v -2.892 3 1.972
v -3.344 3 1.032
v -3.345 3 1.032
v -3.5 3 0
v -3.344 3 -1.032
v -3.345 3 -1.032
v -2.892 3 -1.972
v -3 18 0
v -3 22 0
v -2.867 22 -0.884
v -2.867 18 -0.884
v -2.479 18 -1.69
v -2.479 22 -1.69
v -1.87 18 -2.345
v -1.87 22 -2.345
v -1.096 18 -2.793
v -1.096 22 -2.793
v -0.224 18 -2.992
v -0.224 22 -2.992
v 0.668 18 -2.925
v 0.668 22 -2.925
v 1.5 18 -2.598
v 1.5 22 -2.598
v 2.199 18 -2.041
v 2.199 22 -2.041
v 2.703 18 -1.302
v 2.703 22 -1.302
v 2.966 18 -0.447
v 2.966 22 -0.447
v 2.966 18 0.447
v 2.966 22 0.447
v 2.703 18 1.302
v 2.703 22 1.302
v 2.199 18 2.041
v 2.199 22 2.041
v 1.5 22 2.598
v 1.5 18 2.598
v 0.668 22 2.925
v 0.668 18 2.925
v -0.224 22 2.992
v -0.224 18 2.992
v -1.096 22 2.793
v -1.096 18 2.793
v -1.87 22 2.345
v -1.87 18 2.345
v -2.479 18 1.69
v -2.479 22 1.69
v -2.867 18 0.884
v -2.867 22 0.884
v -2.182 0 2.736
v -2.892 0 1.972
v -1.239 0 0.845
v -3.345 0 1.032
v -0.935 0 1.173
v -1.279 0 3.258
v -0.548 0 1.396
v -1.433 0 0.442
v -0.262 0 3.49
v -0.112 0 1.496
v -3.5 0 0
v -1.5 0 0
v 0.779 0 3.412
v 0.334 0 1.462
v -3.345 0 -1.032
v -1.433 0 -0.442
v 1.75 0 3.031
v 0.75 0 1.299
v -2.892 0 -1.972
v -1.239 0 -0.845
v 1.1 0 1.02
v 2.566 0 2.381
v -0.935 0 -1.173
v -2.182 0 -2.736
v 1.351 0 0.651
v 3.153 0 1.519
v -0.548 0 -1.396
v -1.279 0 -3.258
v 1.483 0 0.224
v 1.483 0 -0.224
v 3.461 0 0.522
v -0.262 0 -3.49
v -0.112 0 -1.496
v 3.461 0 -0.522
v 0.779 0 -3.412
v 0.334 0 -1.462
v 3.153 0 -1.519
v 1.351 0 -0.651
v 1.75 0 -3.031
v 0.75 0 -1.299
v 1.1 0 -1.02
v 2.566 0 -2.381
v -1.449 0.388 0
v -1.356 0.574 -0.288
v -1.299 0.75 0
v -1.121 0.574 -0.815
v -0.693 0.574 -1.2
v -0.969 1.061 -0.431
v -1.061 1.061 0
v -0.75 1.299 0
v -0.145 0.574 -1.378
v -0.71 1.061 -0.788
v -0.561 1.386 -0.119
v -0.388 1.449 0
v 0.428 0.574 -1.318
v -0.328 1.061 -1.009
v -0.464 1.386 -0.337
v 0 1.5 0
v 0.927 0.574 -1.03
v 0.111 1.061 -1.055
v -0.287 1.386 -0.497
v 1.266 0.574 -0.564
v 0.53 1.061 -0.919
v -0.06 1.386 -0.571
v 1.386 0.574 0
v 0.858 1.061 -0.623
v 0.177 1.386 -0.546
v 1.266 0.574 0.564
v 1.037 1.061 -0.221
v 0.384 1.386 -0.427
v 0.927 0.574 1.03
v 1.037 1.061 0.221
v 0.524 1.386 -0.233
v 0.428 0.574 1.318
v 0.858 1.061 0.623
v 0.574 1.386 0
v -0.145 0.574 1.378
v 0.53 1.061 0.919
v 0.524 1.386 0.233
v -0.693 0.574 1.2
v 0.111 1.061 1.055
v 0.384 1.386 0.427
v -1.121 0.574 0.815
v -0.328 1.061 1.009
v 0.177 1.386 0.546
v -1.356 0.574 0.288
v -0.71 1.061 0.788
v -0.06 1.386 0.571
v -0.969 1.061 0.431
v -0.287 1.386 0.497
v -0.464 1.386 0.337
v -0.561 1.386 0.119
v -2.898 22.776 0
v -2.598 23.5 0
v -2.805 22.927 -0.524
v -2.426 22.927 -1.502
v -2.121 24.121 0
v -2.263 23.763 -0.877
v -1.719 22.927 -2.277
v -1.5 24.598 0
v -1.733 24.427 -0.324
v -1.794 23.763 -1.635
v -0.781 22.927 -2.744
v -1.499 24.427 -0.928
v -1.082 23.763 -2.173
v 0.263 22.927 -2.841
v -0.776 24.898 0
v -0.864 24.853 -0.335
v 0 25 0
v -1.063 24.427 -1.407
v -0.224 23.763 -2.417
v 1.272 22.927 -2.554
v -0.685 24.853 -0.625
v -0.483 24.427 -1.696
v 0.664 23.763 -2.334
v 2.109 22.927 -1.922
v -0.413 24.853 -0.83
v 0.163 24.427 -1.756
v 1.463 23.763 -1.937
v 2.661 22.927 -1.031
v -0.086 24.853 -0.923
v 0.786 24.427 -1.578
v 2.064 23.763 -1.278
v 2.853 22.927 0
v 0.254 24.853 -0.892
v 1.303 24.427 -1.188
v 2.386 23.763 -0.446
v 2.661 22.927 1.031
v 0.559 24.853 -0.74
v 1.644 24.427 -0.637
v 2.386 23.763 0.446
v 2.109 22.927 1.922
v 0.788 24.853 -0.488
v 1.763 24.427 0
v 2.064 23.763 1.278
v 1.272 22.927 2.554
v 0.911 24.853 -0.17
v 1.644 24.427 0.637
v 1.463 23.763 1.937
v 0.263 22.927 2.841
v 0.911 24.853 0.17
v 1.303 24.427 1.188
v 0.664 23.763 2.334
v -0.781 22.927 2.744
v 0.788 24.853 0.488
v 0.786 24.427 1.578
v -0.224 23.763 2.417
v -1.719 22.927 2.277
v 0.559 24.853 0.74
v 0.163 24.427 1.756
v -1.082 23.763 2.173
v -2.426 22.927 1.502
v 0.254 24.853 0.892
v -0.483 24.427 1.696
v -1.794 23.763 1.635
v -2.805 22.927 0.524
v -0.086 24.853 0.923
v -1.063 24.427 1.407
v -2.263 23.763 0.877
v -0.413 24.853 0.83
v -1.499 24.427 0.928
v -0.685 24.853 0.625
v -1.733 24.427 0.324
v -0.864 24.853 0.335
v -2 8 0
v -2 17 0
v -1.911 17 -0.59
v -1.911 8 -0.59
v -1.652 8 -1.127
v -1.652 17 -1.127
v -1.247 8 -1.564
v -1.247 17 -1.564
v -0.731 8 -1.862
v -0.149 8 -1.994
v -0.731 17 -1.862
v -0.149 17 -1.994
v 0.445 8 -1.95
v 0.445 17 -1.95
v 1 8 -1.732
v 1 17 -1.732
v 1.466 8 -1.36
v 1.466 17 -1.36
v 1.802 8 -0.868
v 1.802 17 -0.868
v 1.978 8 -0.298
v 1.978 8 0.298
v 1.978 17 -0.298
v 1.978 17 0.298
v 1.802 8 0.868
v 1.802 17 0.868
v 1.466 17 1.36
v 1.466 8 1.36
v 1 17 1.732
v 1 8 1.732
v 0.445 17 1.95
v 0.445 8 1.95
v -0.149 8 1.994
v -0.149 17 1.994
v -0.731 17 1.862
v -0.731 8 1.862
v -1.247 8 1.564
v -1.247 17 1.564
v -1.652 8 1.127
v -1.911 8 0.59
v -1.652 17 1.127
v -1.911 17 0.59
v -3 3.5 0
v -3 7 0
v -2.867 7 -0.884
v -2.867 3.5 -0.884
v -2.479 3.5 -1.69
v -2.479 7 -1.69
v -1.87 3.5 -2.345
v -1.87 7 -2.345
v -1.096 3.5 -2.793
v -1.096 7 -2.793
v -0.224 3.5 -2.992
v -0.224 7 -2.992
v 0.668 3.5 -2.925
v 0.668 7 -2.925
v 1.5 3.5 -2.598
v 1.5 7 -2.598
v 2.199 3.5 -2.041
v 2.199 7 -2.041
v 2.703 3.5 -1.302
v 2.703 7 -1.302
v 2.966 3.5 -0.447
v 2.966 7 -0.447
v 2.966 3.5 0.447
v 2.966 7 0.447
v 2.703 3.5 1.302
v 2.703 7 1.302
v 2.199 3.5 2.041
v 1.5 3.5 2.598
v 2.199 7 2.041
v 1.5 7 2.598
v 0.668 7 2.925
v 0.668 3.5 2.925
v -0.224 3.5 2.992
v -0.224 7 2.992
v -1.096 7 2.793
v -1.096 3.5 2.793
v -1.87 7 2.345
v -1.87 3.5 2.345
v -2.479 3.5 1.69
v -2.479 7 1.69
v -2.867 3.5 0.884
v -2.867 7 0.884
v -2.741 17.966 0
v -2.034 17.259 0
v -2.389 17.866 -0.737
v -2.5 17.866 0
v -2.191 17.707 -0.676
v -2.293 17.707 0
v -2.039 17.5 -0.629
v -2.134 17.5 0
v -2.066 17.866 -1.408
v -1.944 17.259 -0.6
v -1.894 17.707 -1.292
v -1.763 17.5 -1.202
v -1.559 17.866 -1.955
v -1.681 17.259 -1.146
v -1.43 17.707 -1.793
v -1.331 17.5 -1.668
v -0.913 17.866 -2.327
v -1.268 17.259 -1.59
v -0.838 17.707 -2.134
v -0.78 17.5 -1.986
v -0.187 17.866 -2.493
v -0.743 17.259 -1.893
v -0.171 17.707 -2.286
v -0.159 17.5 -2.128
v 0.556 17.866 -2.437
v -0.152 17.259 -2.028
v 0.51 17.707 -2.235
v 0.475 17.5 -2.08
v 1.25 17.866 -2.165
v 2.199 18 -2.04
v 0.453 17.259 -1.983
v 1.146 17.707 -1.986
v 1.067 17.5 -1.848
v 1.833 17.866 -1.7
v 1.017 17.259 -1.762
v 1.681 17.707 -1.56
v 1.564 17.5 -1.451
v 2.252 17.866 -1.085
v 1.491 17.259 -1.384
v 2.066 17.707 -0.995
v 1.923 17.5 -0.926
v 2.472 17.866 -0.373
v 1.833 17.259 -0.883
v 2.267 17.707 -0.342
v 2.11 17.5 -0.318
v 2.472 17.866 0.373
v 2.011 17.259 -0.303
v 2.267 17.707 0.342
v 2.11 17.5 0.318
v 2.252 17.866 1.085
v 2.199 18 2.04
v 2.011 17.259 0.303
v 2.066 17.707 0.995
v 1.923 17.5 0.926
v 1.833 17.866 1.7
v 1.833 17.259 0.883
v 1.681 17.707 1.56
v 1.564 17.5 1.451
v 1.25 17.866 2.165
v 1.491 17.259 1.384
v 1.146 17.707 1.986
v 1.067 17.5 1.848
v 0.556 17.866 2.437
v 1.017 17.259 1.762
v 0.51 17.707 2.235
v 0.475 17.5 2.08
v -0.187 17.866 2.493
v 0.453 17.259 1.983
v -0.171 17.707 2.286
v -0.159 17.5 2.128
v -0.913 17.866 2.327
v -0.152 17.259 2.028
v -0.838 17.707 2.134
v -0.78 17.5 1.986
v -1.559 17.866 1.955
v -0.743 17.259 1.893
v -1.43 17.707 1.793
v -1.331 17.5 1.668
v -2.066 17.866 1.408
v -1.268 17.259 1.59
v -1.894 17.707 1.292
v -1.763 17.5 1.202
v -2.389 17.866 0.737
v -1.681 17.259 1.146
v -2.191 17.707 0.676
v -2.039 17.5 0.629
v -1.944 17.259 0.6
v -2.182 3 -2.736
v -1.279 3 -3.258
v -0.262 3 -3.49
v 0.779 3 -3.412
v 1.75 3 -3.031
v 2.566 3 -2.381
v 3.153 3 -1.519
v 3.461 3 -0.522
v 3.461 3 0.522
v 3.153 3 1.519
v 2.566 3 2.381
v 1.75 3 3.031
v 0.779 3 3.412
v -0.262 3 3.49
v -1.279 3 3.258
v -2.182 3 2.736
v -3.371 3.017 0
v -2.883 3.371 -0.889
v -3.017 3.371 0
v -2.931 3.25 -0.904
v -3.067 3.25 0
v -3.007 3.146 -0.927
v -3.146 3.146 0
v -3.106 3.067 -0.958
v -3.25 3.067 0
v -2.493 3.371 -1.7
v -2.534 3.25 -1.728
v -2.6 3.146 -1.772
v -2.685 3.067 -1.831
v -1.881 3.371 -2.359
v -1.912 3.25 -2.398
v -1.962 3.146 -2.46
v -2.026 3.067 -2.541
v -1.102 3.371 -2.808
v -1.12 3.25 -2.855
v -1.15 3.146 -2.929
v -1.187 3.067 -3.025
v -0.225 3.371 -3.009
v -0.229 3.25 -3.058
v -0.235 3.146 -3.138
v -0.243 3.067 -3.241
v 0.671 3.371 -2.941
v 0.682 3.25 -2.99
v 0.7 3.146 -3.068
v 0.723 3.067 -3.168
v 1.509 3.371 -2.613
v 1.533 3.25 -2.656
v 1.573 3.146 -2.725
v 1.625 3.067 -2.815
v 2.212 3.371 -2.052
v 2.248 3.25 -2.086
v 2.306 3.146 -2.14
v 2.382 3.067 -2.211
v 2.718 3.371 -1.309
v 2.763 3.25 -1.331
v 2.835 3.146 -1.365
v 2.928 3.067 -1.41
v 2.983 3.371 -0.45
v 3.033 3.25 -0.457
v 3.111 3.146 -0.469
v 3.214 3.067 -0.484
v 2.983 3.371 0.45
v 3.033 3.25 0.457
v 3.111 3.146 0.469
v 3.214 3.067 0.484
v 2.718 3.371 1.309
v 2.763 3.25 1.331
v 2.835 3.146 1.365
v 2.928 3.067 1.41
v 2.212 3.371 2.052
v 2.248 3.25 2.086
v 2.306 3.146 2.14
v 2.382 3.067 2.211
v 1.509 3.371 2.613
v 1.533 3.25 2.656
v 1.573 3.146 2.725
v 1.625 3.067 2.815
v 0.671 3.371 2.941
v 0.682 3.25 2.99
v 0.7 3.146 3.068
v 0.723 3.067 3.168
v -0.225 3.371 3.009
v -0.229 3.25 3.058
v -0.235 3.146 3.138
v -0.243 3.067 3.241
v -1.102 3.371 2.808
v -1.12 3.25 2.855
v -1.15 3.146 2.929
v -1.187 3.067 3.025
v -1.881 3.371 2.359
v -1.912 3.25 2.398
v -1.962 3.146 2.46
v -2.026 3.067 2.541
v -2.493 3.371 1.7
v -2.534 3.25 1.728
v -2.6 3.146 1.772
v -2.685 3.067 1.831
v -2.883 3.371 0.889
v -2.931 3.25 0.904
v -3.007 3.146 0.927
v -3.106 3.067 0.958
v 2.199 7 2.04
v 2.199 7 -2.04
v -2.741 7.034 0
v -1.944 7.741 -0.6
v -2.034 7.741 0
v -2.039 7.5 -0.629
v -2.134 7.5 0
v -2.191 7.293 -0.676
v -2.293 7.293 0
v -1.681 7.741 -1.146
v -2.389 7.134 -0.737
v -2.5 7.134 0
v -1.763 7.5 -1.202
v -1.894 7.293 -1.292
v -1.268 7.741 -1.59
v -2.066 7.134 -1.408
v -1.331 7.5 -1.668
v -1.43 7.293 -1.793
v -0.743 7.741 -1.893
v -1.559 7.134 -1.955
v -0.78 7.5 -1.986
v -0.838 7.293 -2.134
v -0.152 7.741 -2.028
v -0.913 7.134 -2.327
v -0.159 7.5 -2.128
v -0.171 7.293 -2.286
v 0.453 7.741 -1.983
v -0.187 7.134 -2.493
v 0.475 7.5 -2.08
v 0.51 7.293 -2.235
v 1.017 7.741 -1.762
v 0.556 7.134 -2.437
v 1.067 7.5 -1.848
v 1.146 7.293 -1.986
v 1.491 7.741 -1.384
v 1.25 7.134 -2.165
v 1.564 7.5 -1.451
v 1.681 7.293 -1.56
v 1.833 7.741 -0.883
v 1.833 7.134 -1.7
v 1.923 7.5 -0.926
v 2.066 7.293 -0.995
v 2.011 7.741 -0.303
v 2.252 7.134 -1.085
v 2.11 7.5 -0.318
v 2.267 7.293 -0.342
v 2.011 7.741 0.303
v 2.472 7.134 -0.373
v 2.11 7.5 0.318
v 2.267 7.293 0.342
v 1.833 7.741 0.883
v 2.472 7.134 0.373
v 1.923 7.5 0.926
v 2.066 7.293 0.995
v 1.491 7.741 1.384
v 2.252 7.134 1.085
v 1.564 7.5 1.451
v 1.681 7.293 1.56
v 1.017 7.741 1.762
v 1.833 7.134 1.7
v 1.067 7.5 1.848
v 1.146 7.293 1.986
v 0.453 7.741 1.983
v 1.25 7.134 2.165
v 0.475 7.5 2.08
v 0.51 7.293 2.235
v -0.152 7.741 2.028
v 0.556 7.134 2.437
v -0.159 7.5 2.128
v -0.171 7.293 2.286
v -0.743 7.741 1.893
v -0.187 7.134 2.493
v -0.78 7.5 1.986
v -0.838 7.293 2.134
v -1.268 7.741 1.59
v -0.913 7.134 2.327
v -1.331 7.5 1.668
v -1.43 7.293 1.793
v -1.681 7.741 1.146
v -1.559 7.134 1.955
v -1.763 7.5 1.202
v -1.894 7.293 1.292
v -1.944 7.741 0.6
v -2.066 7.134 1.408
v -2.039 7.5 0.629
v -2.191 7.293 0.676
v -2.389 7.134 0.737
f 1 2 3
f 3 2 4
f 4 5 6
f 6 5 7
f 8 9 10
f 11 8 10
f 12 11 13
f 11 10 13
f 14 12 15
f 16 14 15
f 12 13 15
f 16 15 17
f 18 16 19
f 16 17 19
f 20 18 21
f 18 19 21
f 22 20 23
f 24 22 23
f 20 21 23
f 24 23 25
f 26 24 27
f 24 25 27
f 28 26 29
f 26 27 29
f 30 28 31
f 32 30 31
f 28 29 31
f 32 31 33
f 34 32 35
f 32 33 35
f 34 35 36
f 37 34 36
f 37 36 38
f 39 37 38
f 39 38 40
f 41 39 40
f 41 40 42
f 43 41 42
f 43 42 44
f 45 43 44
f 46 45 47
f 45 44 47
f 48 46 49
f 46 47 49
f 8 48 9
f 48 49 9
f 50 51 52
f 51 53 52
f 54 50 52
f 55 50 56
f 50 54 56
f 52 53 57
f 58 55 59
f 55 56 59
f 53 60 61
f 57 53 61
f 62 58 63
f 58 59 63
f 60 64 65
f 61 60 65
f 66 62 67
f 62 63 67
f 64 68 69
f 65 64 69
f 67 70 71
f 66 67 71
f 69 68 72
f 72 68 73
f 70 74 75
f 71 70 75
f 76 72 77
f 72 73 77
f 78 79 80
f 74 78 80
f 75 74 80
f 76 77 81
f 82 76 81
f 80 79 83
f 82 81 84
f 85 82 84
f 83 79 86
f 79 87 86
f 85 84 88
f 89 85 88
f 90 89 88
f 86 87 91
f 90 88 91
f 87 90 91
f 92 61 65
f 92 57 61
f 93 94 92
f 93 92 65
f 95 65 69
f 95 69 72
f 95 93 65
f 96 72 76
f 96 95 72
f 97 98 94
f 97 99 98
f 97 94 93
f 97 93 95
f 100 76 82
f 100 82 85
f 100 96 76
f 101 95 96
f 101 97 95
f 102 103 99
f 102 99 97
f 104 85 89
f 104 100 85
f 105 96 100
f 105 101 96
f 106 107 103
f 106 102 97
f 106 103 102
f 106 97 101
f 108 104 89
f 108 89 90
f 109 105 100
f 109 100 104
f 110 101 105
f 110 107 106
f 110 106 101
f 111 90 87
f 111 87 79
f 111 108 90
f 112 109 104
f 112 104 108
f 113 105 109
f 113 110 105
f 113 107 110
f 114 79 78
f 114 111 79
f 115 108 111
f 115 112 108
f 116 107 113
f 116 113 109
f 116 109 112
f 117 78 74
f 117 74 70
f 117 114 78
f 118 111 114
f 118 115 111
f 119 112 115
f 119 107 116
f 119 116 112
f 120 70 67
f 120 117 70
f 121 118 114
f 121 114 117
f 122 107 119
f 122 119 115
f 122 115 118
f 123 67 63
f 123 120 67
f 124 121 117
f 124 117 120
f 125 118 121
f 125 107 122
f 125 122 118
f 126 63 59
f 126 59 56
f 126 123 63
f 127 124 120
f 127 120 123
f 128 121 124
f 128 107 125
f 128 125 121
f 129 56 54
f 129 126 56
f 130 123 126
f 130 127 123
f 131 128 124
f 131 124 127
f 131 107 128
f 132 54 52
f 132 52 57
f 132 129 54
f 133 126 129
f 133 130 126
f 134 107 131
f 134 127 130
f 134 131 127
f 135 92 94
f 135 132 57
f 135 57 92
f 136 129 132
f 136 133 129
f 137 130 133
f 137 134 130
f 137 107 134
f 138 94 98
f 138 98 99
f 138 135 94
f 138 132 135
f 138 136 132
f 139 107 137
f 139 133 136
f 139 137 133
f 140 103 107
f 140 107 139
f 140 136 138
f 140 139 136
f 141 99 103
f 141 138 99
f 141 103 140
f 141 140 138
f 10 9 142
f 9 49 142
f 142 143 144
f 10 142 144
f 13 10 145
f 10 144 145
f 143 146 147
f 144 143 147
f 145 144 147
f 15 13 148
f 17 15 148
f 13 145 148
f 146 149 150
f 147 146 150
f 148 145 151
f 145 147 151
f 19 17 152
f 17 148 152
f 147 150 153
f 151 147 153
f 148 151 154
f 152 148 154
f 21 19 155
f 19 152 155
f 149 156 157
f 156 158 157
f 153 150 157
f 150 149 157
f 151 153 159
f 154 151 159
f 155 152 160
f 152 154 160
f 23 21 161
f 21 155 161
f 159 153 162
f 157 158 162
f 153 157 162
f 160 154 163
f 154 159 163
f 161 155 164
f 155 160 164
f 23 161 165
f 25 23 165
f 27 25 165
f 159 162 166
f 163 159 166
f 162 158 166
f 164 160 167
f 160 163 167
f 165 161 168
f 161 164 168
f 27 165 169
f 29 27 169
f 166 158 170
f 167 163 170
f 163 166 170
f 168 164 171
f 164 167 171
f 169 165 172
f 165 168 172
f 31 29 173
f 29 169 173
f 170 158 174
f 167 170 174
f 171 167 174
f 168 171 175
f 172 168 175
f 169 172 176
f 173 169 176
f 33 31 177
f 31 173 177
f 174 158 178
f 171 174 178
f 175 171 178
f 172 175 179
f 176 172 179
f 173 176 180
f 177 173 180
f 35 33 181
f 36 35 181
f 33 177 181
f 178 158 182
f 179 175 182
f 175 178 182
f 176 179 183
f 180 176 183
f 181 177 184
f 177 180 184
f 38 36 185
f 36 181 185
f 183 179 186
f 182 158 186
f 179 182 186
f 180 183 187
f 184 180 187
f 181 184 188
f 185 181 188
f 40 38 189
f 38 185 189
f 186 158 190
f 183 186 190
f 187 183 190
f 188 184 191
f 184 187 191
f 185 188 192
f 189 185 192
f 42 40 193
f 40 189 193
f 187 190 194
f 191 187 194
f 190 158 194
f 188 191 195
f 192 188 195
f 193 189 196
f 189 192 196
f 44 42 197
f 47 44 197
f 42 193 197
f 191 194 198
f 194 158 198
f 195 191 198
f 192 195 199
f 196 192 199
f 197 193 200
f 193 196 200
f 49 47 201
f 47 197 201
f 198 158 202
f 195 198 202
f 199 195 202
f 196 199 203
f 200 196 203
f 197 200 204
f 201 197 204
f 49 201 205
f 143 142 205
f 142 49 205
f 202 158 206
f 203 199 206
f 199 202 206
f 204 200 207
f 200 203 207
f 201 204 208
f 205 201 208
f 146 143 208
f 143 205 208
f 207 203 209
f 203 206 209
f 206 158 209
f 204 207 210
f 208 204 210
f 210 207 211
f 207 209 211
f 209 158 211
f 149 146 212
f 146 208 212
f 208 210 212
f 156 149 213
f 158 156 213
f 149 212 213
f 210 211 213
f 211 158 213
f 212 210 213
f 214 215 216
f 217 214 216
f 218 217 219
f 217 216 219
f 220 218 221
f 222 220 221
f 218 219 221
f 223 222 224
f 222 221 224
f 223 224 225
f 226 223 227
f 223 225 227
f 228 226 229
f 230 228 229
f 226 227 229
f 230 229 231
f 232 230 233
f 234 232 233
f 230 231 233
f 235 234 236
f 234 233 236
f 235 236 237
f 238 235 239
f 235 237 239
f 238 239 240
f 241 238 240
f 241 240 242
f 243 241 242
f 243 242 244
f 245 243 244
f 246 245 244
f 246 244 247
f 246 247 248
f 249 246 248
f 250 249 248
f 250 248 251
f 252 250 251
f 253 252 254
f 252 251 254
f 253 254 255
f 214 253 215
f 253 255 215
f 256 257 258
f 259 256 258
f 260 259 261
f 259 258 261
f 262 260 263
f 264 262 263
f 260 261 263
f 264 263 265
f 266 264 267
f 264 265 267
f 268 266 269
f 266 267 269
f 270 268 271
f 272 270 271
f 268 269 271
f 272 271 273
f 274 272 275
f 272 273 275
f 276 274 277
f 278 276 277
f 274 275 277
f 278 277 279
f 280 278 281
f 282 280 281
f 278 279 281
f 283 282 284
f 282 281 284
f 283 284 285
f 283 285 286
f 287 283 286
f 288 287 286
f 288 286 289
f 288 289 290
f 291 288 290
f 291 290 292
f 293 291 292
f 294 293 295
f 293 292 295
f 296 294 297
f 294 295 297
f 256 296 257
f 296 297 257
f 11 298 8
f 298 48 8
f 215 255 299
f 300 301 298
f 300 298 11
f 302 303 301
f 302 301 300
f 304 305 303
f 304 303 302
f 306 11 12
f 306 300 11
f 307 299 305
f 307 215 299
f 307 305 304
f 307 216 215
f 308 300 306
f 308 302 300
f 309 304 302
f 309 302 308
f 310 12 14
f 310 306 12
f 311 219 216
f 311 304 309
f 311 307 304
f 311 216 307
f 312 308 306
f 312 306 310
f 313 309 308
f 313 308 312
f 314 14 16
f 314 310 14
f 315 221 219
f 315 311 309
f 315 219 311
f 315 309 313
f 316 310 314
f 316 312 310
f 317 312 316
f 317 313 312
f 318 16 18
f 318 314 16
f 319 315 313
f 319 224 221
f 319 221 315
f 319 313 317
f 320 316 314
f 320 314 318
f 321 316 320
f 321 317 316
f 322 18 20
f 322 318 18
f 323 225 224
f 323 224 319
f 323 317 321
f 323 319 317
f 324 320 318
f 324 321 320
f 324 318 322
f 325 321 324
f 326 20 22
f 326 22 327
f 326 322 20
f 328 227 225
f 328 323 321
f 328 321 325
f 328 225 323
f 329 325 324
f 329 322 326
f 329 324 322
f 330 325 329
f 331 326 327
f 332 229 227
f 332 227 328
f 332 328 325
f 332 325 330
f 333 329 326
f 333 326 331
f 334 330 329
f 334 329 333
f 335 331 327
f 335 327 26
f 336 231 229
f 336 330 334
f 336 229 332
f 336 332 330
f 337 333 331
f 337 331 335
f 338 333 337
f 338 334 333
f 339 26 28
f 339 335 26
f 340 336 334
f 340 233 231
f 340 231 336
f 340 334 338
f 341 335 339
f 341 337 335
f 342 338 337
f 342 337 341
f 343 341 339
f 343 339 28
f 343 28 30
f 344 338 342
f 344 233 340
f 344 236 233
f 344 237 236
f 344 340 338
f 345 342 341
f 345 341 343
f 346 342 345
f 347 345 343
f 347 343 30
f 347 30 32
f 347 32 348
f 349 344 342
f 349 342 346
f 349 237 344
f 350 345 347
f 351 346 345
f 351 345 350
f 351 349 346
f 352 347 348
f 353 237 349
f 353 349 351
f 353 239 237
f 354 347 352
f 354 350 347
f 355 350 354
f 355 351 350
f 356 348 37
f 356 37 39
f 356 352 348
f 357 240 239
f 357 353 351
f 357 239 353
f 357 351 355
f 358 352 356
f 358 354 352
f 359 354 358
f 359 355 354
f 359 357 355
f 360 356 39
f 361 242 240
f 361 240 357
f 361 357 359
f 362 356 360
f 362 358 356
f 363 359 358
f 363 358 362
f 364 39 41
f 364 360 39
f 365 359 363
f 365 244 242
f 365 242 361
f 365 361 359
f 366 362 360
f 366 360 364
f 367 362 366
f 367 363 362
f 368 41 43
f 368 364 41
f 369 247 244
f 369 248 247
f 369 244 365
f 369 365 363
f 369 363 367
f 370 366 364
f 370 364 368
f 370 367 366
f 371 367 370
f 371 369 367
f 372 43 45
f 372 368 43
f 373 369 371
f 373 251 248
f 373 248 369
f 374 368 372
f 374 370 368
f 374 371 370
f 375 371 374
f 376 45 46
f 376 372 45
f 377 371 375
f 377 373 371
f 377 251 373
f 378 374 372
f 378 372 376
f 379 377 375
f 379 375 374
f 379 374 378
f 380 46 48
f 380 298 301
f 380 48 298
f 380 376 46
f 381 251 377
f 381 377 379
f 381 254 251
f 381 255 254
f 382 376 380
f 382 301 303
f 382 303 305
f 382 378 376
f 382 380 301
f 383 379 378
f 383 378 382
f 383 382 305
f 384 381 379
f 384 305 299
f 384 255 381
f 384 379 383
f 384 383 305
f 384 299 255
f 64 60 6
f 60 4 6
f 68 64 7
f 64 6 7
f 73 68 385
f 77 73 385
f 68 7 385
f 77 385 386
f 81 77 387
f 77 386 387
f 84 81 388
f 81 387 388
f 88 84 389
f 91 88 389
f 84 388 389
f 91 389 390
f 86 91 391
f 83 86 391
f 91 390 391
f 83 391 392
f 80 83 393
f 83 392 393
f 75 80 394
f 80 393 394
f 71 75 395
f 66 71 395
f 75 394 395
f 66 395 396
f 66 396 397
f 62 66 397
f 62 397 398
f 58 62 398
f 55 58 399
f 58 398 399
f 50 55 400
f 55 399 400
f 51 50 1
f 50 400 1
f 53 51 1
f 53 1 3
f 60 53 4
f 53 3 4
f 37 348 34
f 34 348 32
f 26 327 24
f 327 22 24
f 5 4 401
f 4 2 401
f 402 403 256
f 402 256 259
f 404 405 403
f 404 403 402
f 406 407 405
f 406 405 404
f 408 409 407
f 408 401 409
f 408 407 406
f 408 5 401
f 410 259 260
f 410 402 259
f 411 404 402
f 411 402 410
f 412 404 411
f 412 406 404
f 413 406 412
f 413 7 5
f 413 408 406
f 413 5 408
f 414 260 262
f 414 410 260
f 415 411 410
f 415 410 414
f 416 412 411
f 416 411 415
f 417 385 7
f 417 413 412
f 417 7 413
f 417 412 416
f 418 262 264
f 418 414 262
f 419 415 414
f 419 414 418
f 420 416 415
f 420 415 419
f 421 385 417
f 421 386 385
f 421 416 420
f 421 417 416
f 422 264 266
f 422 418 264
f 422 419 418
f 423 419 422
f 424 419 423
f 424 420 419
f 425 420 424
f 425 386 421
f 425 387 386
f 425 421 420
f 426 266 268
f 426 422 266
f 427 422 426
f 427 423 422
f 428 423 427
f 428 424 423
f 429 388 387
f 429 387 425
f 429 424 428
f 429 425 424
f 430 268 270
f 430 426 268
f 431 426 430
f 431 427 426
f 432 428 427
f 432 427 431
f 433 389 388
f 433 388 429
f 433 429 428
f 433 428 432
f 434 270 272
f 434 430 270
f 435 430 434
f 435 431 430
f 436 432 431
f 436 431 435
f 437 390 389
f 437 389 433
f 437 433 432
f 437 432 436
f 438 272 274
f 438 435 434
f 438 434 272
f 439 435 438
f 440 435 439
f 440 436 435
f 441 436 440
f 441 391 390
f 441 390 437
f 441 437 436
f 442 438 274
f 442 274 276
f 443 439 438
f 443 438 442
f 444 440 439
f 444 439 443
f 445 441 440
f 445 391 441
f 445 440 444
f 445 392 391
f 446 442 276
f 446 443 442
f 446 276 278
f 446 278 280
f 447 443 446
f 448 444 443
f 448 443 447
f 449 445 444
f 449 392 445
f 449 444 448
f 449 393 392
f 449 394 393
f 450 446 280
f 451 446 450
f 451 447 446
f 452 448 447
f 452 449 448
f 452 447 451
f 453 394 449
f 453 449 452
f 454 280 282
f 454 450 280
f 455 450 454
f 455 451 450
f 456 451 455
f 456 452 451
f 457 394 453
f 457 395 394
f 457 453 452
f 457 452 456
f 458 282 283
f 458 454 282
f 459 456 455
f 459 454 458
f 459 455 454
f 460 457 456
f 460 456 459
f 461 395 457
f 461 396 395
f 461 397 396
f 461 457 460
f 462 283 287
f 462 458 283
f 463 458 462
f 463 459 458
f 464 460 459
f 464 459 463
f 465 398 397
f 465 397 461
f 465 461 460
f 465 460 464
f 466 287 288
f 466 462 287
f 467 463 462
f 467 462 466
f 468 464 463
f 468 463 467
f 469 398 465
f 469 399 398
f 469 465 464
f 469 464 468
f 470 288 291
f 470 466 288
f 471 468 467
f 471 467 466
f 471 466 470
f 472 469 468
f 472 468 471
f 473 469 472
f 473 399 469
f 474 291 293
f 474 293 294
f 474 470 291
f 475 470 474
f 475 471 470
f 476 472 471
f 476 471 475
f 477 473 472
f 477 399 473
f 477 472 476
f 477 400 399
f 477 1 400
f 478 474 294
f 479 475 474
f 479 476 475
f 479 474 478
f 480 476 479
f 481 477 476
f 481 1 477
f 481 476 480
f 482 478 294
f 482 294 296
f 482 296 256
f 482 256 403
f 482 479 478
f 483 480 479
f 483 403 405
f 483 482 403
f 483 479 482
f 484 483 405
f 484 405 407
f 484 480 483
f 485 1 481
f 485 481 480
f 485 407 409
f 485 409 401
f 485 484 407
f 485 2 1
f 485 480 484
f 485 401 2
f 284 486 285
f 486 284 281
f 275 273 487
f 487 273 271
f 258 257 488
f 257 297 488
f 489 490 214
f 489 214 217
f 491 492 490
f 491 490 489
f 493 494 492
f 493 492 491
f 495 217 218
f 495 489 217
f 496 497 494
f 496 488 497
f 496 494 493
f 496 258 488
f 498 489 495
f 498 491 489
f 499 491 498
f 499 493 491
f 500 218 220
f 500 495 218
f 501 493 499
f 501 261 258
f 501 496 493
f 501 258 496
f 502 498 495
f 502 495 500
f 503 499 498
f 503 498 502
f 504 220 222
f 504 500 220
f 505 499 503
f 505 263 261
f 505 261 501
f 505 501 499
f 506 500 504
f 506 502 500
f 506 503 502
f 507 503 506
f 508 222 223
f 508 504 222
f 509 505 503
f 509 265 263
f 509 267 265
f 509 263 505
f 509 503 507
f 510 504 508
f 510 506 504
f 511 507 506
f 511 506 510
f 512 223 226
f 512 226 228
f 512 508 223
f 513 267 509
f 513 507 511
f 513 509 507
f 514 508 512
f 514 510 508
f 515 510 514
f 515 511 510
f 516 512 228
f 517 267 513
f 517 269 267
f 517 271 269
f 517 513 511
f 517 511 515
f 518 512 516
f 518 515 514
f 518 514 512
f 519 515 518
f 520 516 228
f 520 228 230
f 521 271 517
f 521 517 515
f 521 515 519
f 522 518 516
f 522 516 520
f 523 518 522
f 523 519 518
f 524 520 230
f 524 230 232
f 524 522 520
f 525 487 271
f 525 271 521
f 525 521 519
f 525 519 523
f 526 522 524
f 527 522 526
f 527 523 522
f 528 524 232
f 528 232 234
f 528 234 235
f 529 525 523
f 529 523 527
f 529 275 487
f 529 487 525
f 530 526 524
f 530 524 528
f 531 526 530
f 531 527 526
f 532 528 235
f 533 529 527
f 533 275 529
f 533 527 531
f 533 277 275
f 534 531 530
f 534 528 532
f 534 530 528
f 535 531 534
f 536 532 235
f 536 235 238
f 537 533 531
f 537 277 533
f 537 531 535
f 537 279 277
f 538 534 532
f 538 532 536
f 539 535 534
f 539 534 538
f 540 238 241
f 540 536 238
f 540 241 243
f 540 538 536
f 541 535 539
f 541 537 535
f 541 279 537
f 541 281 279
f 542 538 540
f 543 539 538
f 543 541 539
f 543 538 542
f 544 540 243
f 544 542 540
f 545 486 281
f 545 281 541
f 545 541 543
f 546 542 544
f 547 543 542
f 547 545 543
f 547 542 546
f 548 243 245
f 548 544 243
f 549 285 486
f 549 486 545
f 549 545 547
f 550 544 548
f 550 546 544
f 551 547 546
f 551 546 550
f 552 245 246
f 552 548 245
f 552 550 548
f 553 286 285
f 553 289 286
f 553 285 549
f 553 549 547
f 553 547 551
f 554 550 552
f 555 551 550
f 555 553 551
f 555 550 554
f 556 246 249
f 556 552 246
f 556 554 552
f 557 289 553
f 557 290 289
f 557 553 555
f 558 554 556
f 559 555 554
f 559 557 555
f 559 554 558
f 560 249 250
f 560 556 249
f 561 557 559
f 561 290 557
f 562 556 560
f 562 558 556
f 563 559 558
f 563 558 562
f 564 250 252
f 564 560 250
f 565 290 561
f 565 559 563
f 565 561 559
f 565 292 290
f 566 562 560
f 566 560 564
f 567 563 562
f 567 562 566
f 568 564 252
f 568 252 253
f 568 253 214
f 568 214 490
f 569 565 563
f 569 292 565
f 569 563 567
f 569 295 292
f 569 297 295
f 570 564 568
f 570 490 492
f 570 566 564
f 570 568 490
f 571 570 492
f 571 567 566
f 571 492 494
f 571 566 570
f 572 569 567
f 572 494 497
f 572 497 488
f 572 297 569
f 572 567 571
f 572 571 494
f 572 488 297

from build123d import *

# Parameters (mm, degrees)
FILLET1_R = 3
FILLET2_R = 1
FILLET3_R = 0.5


with BuildPart() as part:
    # Sketch1 → Revolve1 (revolve)
    with BuildSketch(Plane.XY, mode=Mode.PRIVATE) as revolve1_sk:
        Polygon((0, 0), (3.5, 0), (3.5, 3), (3, 3), (3, 7), (2, 7), (2, 18), (3, 18), (3, 25), (0, 25), align=None)
    revolve(revolve1_sk.sketch.rotate(Axis((0, 25, 0), (0, -1, 0)), 180), axis=Axis((0, 25, 0), (0, -1, 0)))

    # Fillet1
    fillet1_edges = [part.edges().sort_by_distance(p)[0] for p in [
        (3, 25, 0),
    ]]
    fillet(fillet1_edges, radius=FILLET1_R)

    # Fillet2
    fillet2_edges = [part.edges().sort_by_distance(p)[0] for p in [
        (2, 18, 0),
        (2, 7, 0),
    ]]
    fillet(fillet2_edges, radius=FILLET2_R - 0.0001)  # a hair under: the kernel refuses the full size

    # Fillet3
    fillet3_edges = [part.edges().sort_by_distance(p)[0] for p in [
        (3, 3, 0),
    ]]
    fillet(fillet3_edges, radius=FILLET3_R - 0.0001)  # a hair under: the kernel refuses the full size

    # Sketch2 → Cut-Revolve1 (revolve, cut)
    with BuildSketch(Plane.XY, mode=Mode.PRIVATE) as cut_revolve1_sk:
        with BuildLine():
            Line((0, 1.5), (0, 0))
            Line((0, 0), (1.5, 0))
            ThreePointArc((1.5, 0), (1.060660172, 1.060660172), (0, 1.5))
        make_face()
    revolve(cut_revolve1_sk.sketch.rotate(Axis((0, 1.5, 0), (0, -1, 0)), 180), axis=Axis((0, 1.5, 0), (0, -1, 0)), mode=Mode.SUBTRACT)


solid = part.part
